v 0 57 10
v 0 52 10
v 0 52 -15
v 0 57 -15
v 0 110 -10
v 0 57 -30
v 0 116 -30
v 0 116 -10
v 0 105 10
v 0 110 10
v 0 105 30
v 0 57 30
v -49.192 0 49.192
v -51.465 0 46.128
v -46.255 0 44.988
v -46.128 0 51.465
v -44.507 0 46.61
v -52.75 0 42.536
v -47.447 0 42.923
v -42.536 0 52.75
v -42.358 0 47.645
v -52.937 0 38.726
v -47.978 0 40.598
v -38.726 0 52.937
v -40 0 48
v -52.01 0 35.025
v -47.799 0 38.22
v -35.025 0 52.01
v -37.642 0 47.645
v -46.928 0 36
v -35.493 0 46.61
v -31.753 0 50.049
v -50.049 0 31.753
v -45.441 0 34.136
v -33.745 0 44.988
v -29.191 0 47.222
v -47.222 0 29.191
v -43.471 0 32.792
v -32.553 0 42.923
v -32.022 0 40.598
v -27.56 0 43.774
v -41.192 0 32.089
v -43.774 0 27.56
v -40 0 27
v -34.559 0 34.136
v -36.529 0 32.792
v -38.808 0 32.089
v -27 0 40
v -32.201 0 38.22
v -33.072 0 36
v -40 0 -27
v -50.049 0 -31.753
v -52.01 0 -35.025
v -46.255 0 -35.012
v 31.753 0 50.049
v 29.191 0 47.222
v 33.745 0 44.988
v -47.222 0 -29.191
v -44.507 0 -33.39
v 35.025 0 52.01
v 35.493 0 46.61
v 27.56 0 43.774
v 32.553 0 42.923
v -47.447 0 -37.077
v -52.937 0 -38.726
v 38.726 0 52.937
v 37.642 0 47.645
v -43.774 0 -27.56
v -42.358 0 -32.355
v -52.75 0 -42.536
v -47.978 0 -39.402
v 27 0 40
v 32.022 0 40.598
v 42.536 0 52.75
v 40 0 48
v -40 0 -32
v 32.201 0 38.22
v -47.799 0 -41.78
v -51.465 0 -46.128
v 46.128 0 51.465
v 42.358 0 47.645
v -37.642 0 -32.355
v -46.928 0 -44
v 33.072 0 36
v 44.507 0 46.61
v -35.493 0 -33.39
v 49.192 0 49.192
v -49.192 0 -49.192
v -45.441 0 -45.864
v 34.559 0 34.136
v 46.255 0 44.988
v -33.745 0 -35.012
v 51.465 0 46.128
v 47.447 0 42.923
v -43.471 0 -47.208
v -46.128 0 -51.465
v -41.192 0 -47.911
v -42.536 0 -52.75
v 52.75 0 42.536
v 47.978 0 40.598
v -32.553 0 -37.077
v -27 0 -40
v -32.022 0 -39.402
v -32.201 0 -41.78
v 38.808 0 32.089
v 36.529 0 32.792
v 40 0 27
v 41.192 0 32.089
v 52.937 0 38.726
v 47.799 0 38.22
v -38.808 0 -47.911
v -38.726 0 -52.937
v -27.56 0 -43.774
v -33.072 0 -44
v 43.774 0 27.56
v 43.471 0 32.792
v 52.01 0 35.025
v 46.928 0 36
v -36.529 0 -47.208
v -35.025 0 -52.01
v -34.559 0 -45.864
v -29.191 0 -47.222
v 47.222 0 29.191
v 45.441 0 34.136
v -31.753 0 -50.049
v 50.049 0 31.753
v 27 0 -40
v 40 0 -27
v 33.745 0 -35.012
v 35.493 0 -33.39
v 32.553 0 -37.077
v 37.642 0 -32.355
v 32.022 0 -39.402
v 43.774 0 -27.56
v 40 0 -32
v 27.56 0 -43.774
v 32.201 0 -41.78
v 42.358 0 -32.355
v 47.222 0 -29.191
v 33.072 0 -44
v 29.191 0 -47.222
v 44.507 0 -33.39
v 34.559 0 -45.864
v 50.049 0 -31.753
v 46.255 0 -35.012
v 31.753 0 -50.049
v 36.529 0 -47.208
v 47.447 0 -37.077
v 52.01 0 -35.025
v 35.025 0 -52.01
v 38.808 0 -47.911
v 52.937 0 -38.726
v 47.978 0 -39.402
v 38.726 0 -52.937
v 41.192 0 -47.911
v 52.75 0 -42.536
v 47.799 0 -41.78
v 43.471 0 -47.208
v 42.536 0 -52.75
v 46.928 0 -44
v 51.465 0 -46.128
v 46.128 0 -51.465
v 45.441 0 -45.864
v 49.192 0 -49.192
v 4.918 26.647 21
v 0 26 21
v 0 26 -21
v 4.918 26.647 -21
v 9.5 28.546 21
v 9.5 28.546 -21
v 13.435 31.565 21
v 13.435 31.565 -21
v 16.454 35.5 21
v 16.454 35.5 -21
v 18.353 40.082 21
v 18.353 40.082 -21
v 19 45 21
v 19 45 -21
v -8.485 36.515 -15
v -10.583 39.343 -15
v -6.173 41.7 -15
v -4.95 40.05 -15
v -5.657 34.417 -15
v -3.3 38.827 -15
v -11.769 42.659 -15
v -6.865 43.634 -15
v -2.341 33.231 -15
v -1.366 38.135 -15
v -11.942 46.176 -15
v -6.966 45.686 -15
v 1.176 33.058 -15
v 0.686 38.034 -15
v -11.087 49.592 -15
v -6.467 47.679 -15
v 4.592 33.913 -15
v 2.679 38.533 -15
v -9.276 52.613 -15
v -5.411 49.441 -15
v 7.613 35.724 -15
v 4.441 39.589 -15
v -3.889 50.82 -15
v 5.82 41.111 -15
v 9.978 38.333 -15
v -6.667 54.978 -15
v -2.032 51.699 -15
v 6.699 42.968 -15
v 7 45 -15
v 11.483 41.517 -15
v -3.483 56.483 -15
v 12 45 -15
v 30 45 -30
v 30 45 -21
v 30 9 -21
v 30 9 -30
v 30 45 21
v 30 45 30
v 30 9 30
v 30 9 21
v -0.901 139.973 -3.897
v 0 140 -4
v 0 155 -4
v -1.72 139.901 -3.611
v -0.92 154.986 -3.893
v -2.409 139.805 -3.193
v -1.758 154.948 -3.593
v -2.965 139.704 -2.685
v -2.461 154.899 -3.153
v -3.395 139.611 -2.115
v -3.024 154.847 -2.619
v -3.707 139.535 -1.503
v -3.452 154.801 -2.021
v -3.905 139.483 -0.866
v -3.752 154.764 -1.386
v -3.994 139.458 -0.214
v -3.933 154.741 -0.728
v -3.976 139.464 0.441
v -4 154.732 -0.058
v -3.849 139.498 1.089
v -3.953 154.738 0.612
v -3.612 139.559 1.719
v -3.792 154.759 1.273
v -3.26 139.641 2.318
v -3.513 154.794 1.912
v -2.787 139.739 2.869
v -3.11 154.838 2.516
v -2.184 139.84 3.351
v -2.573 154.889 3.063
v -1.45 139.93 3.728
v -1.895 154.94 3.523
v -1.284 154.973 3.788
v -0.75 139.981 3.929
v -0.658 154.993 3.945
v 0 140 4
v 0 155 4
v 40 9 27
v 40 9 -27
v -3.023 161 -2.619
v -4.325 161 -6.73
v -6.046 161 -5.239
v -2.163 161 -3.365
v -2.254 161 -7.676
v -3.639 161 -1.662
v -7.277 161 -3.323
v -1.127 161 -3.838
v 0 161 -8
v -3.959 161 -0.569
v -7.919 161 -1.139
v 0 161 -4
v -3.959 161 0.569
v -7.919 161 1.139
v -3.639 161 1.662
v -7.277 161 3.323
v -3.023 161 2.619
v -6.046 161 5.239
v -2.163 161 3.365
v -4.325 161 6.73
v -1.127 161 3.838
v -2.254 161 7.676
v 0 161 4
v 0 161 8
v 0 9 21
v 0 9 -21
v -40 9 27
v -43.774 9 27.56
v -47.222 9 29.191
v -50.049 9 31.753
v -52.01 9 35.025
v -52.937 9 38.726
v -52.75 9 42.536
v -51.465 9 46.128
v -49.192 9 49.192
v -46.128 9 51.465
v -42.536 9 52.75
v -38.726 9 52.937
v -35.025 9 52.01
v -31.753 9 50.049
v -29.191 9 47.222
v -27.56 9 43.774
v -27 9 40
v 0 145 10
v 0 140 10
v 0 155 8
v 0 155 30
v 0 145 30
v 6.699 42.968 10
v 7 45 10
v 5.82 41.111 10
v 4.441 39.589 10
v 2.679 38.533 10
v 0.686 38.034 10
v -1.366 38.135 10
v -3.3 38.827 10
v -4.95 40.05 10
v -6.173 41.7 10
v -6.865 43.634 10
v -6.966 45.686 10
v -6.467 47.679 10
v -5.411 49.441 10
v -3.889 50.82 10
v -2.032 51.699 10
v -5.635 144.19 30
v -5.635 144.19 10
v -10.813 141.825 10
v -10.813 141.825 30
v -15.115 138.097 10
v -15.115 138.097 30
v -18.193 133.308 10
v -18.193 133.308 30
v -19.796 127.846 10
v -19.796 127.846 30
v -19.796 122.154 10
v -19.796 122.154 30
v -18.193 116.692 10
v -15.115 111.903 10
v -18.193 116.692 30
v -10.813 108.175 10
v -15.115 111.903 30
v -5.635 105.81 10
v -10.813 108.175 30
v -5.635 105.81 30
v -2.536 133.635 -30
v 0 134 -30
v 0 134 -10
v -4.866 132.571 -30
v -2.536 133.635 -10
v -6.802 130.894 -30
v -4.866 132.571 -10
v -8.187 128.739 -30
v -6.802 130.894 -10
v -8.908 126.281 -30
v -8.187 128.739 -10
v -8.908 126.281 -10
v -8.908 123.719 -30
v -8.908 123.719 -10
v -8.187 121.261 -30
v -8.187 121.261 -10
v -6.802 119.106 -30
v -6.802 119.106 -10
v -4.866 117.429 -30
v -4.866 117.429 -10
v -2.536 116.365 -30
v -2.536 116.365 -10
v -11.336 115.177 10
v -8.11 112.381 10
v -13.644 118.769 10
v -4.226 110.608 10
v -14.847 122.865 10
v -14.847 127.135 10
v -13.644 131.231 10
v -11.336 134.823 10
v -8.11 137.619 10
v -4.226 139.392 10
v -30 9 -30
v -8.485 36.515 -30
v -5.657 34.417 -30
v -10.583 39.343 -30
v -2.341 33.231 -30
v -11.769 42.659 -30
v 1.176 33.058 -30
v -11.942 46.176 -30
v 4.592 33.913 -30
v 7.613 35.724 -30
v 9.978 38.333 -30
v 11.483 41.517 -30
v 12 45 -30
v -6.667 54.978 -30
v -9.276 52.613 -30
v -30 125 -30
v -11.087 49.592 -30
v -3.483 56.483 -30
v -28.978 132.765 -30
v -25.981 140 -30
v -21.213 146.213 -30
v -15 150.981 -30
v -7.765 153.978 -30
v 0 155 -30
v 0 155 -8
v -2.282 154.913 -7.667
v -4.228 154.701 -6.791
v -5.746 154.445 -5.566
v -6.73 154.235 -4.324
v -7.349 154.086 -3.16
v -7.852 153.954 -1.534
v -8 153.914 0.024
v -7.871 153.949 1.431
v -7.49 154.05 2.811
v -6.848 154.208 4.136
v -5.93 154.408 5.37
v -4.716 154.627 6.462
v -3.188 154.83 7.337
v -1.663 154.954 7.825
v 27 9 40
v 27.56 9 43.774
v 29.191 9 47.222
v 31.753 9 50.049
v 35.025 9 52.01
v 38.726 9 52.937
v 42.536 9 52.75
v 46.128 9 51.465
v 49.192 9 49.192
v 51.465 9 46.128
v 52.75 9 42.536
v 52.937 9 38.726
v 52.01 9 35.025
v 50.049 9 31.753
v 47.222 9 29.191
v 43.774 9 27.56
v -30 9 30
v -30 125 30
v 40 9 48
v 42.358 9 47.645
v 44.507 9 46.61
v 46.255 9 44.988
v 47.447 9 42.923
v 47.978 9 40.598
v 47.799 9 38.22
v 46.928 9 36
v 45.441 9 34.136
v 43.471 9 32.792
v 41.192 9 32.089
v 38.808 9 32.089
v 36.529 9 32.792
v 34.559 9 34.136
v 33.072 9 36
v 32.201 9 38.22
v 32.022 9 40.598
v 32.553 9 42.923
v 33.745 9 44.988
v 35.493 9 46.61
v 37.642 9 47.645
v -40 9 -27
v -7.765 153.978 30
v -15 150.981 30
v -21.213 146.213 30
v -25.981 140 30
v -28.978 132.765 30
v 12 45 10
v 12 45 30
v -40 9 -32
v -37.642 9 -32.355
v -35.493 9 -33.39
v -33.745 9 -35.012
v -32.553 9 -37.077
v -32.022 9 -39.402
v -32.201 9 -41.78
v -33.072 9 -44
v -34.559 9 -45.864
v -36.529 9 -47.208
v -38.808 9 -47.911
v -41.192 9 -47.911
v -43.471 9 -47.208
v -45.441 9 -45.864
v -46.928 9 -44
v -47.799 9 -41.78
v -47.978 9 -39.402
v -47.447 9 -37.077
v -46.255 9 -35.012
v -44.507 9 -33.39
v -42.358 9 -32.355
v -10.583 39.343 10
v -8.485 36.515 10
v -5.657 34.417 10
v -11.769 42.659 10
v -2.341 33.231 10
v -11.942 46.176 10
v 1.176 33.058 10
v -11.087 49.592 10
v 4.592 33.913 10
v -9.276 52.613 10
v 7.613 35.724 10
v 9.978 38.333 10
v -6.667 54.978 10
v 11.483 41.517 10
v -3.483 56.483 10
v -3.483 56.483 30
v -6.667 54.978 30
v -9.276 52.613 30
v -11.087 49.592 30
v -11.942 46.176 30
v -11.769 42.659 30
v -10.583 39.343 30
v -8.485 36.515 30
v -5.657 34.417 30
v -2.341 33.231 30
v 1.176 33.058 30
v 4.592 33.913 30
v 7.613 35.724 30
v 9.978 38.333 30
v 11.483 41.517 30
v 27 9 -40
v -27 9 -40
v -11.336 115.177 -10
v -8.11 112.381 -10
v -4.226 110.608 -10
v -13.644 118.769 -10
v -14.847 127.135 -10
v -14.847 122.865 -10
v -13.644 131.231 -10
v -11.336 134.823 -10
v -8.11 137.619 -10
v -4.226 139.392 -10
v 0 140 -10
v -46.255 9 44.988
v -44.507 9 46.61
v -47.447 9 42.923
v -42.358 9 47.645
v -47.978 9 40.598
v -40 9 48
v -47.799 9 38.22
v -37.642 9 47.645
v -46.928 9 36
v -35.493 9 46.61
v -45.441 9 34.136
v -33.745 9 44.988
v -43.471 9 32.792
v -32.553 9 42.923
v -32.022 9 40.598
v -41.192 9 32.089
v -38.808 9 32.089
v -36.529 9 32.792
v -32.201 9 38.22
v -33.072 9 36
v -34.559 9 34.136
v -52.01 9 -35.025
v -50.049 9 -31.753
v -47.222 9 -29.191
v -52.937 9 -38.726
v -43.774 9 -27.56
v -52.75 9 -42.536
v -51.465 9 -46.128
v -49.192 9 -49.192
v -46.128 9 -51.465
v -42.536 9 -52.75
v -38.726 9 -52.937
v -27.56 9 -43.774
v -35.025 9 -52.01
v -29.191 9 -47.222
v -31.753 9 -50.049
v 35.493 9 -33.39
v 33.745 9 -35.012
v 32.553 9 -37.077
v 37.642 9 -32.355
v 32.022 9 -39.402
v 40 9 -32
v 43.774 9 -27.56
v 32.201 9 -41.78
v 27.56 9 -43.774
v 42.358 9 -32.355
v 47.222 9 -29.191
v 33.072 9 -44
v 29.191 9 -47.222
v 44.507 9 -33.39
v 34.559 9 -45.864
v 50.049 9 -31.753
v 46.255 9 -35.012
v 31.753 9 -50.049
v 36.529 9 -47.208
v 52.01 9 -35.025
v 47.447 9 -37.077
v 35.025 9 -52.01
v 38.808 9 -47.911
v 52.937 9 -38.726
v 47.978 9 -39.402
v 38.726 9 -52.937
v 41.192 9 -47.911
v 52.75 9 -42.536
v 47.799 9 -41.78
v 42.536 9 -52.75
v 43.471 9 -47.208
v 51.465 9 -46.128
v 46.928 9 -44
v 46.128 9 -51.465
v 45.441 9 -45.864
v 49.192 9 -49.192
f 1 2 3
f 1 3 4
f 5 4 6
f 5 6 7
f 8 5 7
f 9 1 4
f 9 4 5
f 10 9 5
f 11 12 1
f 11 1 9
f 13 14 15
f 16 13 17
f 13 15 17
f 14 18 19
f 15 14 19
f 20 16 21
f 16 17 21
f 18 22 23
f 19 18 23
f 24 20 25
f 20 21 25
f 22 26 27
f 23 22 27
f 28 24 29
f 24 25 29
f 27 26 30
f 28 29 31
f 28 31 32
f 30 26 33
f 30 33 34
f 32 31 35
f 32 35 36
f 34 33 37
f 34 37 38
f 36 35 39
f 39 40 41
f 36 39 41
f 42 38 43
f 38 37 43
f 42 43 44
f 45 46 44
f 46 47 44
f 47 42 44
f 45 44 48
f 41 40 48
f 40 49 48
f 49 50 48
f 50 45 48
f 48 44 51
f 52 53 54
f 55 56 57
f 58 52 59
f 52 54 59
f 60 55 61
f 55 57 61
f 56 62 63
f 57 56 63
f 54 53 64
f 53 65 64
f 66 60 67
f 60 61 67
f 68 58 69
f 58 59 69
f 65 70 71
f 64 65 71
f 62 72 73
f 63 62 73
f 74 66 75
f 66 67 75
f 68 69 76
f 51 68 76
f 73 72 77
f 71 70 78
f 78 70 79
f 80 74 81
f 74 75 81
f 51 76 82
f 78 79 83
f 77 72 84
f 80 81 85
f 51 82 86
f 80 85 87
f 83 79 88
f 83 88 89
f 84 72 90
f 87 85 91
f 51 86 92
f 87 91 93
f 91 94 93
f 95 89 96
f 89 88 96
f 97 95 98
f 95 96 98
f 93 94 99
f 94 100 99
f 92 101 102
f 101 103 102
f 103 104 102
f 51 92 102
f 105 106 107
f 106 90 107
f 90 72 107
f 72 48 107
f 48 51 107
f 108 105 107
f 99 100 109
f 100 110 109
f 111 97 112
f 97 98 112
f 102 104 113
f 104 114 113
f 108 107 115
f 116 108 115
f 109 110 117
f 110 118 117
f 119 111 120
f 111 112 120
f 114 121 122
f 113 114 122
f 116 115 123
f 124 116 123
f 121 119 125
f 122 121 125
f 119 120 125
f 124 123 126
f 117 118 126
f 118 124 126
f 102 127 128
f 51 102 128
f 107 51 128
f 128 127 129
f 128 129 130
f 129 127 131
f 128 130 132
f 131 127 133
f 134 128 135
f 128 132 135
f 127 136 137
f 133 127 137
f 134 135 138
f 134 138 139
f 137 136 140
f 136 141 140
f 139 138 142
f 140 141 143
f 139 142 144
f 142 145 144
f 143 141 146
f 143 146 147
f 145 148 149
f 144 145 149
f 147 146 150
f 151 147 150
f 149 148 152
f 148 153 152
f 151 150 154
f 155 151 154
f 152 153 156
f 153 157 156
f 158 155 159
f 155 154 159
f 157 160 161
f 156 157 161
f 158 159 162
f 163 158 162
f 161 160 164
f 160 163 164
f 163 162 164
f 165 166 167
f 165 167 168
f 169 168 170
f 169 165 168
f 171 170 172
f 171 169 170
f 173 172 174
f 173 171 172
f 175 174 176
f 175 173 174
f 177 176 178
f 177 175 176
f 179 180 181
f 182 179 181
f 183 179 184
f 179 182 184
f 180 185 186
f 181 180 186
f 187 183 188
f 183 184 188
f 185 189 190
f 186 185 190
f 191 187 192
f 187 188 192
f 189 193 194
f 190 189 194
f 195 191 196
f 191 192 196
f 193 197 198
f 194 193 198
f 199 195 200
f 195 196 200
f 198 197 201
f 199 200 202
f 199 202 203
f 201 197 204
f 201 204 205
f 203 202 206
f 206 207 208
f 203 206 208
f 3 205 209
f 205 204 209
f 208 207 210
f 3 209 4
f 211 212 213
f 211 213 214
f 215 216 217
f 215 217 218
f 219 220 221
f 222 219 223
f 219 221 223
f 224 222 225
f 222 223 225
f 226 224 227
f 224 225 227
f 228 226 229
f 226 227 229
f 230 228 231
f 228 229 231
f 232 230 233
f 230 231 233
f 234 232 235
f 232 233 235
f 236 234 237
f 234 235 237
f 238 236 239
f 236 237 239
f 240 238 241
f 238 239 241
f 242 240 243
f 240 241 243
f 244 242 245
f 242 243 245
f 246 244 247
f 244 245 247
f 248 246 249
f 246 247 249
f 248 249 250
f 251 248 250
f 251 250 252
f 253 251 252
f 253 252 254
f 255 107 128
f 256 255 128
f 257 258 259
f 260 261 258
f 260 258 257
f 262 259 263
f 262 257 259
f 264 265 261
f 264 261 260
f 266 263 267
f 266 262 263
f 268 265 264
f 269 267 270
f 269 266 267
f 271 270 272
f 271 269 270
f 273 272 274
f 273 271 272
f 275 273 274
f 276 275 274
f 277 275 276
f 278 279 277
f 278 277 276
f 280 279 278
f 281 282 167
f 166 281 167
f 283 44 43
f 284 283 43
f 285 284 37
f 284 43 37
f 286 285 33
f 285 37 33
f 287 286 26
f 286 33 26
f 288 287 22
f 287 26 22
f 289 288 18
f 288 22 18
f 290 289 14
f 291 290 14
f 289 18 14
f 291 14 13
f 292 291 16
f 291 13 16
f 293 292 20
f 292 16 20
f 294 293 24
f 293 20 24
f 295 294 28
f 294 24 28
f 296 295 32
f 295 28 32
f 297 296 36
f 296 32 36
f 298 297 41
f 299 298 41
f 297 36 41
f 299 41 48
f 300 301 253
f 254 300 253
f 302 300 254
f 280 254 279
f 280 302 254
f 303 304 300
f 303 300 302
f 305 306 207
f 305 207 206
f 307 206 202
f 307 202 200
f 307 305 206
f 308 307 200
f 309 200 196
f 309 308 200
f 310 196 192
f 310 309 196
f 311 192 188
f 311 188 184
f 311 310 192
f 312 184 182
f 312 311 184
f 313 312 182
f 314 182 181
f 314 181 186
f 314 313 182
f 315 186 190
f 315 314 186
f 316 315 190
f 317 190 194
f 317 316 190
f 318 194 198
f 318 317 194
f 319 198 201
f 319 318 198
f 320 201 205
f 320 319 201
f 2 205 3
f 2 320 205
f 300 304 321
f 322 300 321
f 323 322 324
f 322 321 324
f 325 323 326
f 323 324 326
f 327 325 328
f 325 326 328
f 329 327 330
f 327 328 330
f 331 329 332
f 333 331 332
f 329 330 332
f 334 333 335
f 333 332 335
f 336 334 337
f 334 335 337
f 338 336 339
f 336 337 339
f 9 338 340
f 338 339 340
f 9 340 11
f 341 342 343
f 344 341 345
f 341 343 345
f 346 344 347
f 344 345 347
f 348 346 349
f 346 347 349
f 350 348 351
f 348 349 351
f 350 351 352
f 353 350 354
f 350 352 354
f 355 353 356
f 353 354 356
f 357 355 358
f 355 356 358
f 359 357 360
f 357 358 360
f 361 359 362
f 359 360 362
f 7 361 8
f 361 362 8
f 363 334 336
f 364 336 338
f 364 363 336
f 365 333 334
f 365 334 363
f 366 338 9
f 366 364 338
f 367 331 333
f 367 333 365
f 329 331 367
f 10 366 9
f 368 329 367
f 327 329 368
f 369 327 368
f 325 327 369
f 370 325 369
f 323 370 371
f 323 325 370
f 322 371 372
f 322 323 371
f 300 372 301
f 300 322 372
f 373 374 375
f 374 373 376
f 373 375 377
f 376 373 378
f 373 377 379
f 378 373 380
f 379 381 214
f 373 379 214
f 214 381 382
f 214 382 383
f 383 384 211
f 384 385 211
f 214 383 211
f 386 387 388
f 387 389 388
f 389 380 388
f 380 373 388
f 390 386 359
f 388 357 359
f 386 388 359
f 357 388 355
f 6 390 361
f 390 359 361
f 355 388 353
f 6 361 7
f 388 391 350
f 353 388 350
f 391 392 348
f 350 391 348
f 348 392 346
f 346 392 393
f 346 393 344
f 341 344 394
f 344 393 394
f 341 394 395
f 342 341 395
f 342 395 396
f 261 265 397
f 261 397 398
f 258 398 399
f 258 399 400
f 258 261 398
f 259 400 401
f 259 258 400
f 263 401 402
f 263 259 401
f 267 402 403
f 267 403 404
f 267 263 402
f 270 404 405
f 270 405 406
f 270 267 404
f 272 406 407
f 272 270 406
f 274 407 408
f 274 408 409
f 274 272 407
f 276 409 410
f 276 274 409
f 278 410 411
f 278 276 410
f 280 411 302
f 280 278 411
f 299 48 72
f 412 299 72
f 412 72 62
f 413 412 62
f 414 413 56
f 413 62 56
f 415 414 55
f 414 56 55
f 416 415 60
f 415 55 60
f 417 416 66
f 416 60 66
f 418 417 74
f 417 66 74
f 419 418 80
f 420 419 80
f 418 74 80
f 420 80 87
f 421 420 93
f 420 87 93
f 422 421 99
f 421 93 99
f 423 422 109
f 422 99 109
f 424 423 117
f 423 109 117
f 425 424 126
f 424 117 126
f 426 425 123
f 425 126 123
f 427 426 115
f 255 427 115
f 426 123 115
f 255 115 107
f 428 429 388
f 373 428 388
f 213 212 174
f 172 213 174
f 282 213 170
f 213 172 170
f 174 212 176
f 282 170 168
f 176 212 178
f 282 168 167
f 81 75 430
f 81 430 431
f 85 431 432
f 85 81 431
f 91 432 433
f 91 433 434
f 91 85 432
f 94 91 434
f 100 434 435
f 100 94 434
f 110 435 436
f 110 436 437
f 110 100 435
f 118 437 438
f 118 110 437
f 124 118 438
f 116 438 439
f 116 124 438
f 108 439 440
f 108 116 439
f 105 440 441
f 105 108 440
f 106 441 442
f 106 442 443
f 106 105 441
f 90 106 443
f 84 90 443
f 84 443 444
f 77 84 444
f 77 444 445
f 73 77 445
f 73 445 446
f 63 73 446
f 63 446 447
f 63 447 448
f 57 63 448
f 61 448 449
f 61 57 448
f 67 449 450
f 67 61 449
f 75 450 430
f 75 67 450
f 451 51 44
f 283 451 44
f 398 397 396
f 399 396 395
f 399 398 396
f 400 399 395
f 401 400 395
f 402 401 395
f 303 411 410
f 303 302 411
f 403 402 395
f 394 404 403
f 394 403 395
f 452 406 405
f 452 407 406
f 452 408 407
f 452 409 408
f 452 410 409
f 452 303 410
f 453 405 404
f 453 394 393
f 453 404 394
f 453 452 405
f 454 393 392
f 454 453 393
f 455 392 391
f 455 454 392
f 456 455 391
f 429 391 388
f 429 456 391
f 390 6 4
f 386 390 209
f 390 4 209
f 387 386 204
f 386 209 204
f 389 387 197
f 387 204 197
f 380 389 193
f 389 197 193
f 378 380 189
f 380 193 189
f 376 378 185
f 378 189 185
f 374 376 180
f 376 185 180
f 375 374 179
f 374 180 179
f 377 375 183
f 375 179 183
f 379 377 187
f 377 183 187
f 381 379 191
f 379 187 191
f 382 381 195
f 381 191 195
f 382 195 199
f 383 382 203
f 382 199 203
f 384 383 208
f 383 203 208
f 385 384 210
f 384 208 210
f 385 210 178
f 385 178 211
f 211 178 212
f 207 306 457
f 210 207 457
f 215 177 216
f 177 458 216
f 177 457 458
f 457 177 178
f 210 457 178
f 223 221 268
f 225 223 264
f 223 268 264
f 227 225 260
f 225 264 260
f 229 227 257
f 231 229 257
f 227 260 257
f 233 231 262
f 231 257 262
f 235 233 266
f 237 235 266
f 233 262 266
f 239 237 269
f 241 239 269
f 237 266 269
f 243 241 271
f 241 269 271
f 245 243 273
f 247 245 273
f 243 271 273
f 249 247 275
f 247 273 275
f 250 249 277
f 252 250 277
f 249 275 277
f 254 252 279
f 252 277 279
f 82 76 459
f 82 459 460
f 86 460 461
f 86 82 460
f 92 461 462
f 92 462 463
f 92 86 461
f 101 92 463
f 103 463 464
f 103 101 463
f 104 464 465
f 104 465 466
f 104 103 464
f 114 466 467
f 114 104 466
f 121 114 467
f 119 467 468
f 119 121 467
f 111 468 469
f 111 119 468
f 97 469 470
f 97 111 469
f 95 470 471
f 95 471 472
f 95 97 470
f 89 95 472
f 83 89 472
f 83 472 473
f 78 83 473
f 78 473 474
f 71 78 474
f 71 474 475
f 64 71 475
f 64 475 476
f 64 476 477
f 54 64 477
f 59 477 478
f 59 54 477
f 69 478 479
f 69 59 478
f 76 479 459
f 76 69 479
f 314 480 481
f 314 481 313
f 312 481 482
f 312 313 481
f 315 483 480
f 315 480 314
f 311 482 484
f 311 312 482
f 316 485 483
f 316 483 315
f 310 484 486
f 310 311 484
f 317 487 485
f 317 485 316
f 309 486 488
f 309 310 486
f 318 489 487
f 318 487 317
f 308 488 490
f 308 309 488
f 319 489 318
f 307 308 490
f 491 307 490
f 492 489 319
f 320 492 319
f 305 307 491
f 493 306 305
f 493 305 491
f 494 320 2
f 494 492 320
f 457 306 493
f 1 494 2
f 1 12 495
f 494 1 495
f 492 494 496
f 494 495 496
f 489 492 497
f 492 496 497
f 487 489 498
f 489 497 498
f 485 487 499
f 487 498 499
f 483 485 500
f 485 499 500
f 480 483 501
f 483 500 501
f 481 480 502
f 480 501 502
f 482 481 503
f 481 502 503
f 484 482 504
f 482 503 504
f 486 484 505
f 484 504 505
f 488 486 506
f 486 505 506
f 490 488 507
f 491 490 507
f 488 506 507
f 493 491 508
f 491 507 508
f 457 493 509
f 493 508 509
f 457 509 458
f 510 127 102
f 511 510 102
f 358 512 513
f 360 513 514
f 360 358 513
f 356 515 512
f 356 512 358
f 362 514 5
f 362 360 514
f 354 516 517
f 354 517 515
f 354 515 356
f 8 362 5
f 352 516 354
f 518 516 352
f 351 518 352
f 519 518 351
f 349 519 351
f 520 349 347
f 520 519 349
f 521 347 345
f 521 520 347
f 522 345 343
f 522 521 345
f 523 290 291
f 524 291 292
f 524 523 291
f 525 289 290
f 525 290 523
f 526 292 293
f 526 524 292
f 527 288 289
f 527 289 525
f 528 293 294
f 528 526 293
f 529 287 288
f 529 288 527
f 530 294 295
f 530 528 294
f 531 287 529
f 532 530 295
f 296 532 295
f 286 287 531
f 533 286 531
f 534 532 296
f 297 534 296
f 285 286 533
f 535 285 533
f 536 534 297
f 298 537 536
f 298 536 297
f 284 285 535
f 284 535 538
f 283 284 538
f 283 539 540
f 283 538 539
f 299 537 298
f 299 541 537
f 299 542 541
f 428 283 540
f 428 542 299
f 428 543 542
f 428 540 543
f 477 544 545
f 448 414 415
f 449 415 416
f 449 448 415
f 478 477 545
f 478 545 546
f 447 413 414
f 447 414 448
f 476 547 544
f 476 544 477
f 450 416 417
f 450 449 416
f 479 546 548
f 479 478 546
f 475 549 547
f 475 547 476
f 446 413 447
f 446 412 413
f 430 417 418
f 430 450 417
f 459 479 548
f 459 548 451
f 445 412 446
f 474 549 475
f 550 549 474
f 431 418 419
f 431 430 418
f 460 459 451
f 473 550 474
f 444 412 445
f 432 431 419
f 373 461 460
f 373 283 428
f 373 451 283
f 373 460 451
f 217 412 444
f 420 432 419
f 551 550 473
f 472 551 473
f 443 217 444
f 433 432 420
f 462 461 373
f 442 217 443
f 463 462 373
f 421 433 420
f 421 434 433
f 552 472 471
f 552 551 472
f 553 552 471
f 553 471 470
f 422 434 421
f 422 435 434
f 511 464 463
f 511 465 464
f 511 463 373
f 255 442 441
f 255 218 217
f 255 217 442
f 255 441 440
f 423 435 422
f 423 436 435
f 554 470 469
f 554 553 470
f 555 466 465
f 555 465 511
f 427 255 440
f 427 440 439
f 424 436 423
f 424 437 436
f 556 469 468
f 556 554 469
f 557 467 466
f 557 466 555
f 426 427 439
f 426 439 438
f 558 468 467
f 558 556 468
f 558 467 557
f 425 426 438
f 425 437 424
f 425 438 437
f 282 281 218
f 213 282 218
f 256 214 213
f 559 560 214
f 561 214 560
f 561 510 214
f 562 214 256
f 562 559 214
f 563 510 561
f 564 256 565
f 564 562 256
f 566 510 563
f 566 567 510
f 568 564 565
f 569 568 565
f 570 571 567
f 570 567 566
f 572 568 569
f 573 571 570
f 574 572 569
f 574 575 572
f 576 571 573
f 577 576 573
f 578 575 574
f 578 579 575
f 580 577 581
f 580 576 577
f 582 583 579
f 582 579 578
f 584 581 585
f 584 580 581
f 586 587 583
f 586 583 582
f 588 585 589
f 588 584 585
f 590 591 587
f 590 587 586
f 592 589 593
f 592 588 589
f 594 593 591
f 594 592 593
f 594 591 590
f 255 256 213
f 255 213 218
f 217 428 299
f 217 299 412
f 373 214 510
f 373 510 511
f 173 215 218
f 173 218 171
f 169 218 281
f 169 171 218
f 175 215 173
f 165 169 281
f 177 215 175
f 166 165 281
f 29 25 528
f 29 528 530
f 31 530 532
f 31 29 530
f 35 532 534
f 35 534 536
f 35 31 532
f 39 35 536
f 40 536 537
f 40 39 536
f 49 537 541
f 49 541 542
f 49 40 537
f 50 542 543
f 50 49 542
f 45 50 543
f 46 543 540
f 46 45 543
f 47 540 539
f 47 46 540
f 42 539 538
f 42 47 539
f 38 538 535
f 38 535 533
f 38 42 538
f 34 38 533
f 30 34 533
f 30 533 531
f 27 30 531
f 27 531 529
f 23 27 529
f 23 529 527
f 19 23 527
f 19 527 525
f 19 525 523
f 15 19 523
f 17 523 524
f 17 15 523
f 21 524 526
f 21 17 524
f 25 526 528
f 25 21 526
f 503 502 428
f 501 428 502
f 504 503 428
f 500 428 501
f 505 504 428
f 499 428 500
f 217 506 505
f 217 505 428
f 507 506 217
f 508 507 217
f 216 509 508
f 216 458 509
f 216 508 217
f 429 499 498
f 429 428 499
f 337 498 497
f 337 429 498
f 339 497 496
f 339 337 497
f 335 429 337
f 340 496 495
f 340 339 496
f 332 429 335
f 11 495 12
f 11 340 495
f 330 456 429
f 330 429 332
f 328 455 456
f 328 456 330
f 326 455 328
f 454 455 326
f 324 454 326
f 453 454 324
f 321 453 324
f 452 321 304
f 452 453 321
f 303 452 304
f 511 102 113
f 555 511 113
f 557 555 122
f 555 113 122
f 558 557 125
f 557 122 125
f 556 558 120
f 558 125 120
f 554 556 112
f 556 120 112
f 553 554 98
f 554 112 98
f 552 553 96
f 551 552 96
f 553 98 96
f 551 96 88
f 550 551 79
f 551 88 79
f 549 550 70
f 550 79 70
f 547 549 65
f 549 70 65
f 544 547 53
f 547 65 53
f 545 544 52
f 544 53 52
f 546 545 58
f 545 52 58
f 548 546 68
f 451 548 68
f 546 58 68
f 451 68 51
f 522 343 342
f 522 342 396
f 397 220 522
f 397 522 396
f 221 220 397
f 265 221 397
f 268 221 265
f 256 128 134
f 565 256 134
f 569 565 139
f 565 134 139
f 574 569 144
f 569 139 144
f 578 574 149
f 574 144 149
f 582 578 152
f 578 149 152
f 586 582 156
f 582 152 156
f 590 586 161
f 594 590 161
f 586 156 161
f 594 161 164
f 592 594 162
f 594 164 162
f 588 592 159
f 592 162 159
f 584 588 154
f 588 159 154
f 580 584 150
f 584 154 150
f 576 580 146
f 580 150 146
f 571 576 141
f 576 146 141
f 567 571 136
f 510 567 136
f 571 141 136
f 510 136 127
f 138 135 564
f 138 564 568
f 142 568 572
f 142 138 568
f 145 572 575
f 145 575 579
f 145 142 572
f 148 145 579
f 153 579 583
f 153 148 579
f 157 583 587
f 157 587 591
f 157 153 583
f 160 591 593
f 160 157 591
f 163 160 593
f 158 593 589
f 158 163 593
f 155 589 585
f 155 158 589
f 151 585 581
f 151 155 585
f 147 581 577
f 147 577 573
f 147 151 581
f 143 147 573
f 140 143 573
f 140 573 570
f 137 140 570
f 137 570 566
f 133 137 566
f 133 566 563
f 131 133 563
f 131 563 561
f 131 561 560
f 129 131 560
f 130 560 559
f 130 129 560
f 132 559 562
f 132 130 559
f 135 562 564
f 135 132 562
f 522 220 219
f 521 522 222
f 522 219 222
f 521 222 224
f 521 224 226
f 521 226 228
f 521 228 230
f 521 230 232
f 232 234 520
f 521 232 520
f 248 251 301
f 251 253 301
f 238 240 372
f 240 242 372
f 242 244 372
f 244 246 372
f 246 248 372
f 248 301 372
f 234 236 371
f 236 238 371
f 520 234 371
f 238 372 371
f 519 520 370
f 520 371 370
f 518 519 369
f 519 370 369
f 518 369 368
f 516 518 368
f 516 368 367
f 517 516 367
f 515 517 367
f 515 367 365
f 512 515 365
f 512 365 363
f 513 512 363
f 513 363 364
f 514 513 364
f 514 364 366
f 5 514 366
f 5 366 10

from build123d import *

# Parameters (mm, degrees)
SKETCH1_R           = 8
BOSS_EXTRUDE1_DEPTH = 9
SKETCH3_W           = 60
SKETCH3_H           = 116
BOSS_EXTRUDE2_DEPTH = 30
SKETCH4_R           = 30
BOSS_EXTRUDE3_DEPTH = 60
SKETCH6_R           = 8
SKETCH6_R_2         = 4
BOSS_EXTRUDE4_DEPTH = 20
SKETCH7_W           = 53.624772313
SKETCH7_H           = 116
CUT_EXTRUDE2_DEPTH  = 189.729965909
SKETCH8_R           = 12
CUT_EXTRUDE3_DEPTH  = 189.729965909
BOSS_EXTRUDE5_START = -25
BOSS_EXTRUDE5_DEPTH = 25
SKETCH10_R          = 20
CUT_EXTRUDE4_DEPTH  = 20
SKETCH11_R          = 15
CUT_EXTRUDE5_DEPTH  = 20
SKETCH12_R          = 9
CUT_EXTRUDE6_DEPTH  = 181.828648262
SKETCH13_R          = 4
CUT_EXTRUDE7_DEPTH  = 31
CUT_EXTRUDE8_DEPTH  = 42


with BuildPart() as part:
    # Sketch1 → Boss-Extrude1 (new body)
    with BuildSketch(Plane(origin=(0, 0, 0), x_dir=(1, 0, 0), z_dir=(0, 1, 0))):
        with BuildLine():
            Line((40, -27), (40, 27))
            ThreePointArc((40, 27), (49.192388155, 49.192388155), (27, 40))
            Line((27, 40), (-27, 40))
            ThreePointArc((-27, 40), (-49.192388155, 49.192388155), (-40, 27))
            Line((-40, 27), (-40, -27))
            ThreePointArc((-40, -27), (-49.192388155, -49.192388155), (-27, -40))
            Line((-27, -40), (27, -40))
            ThreePointArc((27, -40), (49.192388155, -49.192388155), (40, -27))
        make_face()
        with Locations(Location((-40, 40, 0), (0, 0, 270))):
            Circle(SKETCH1_R, mode=Mode.SUBTRACT)
        with Locations(Location((-40, -40, 0), (0, 0, 270))):
            Circle(SKETCH1_R, mode=Mode.SUBTRACT)
        with Locations(Location((40, -40, 0), (0, 0, 270))):
            Circle(SKETCH1_R, mode=Mode.SUBTRACT)
        with Locations(Location((40, 40, 0), (0, 0, 270))):
            Circle(SKETCH1_R, mode=Mode.SUBTRACT)
    extrude(amount=BOSS_EXTRUDE1_DEPTH)

    # Sketch3 → Boss-Extrude2 (add, symmetric)
    with BuildSketch(Plane(origin=(0, 0, 0), x_dir=(0, 0, -1), z_dir=(1, 0, 0))):
        with Locations((0, 67)):
            Rectangle(SKETCH3_W, SKETCH3_H)
    extrude(amount=BOSS_EXTRUDE2_DEPTH, both=True)

    # Sketch4 → Boss-Extrude3 (add)
    with BuildSketch(Plane.XY.offset(30)):
        with Locations((0, 125)):
            Circle(SKETCH4_R)
    extrude(amount=-BOSS_EXTRUDE3_DEPTH)

    # Sketch6 → Boss-Extrude4 (add)
    with BuildSketch(Plane(origin=(0, 161, 0), x_dir=(1, 0, 0), z_dir=(0, 1, 0))):
        with Locations(Location((0, 0, 0), (0, 0, 270))):
            Circle(SKETCH6_R)
        with Locations(Location((0, 0, 0), (0, 0, 270))):
            Circle(SKETCH6_R_2, mode=Mode.SUBTRACT)
    extrude(amount=-BOSS_EXTRUDE4_DEPTH)

    # Sketch7 → Cut-Extrude2 (cut, through all)
    with BuildSketch(Plane.XY.offset(30)):
        with Locations((26.812386157, 103)):
            Rectangle(SKETCH7_W, SKETCH7_H)
    extrude(amount=-CUT_EXTRUDE2_DEPTH, mode=Mode.SUBTRACT)

    # Sketch8 → Cut-Extrude3 (cut, through all)
    with BuildSketch(Plane.XY.offset(30)):
        with Locations((0, 45)):
            Circle(SKETCH8_R)
    extrude(amount=-CUT_EXTRUDE3_DEPTH, mode=Mode.SUBTRACT)

    # Sketch9 → Boss-Extrude5 (add)
    with BuildSketch(Plane(origin=(0, 0, -15), x_dir=(-1, 0, 0), z_dir=(0, 0, -1)).offset(BOSS_EXTRUDE5_START)):
        with BuildLine():
            Line((-12, 45), (-7, 45))
            ThreePointArc((-7, 45), (4.949747468, 40.050252532), (0, 52))
            Line((0, 52), (0, 57))
            ThreePointArc((0, 57), (8.485281374, 36.514718626), (-12, 45))
        make_face()
    extrude(amount=BOSS_EXTRUDE5_DEPTH)

    # Sketch10 → Cut-Extrude4 (cut)
    with BuildSketch(Plane.XY.offset(30)):
        with Locations((0, 125)):
            Circle(SKETCH10_R)
    extrude(amount=-CUT_EXTRUDE4_DEPTH, mode=Mode.SUBTRACT)

    # Sketch11 → Cut-Extrude5 (cut)
    with BuildSketch(Plane.XY.offset(10)):
        with Locations((0, 125)):
            Circle(SKETCH11_R)
    extrude(amount=-CUT_EXTRUDE5_DEPTH, mode=Mode.SUBTRACT)

    # Sketch12 → Cut-Extrude6 (cut, through all)
    with BuildSketch(Plane.XY.offset(-10)):
        with Locations((0, 125)):
            Circle(SKETCH12_R)
    extrude(amount=-CUT_EXTRUDE6_DEPTH, mode=Mode.SUBTRACT)

    # Sketch13 → Cut-Extrude7 (cut)
    with BuildSketch(Plane(origin=(0, 161, 0), x_dir=(1, 0, 0), z_dir=(0, 1, 0))):
        Circle(SKETCH13_R)
    extrude(amount=-CUT_EXTRUDE7_DEPTH, mode=Mode.SUBTRACT)

    # Sketch14 → Cut-Extrude8 (cut)
    with BuildSketch(Plane.XY.offset(21)):
        with BuildLine():
            Line((19, 45), (30, 45))
            Line((30, 45), (30, 9))
            Line((30, 9), (0, 9))
            Line((0, 9), (0, 26))
            ThreePointArc((0, 26), (13.435028843, 31.564971157), (19, 45))
        make_face()
    extrude(amount=-CUT_EXTRUDE8_DEPTH, mode=Mode.SUBTRACT)


solid = part.part
